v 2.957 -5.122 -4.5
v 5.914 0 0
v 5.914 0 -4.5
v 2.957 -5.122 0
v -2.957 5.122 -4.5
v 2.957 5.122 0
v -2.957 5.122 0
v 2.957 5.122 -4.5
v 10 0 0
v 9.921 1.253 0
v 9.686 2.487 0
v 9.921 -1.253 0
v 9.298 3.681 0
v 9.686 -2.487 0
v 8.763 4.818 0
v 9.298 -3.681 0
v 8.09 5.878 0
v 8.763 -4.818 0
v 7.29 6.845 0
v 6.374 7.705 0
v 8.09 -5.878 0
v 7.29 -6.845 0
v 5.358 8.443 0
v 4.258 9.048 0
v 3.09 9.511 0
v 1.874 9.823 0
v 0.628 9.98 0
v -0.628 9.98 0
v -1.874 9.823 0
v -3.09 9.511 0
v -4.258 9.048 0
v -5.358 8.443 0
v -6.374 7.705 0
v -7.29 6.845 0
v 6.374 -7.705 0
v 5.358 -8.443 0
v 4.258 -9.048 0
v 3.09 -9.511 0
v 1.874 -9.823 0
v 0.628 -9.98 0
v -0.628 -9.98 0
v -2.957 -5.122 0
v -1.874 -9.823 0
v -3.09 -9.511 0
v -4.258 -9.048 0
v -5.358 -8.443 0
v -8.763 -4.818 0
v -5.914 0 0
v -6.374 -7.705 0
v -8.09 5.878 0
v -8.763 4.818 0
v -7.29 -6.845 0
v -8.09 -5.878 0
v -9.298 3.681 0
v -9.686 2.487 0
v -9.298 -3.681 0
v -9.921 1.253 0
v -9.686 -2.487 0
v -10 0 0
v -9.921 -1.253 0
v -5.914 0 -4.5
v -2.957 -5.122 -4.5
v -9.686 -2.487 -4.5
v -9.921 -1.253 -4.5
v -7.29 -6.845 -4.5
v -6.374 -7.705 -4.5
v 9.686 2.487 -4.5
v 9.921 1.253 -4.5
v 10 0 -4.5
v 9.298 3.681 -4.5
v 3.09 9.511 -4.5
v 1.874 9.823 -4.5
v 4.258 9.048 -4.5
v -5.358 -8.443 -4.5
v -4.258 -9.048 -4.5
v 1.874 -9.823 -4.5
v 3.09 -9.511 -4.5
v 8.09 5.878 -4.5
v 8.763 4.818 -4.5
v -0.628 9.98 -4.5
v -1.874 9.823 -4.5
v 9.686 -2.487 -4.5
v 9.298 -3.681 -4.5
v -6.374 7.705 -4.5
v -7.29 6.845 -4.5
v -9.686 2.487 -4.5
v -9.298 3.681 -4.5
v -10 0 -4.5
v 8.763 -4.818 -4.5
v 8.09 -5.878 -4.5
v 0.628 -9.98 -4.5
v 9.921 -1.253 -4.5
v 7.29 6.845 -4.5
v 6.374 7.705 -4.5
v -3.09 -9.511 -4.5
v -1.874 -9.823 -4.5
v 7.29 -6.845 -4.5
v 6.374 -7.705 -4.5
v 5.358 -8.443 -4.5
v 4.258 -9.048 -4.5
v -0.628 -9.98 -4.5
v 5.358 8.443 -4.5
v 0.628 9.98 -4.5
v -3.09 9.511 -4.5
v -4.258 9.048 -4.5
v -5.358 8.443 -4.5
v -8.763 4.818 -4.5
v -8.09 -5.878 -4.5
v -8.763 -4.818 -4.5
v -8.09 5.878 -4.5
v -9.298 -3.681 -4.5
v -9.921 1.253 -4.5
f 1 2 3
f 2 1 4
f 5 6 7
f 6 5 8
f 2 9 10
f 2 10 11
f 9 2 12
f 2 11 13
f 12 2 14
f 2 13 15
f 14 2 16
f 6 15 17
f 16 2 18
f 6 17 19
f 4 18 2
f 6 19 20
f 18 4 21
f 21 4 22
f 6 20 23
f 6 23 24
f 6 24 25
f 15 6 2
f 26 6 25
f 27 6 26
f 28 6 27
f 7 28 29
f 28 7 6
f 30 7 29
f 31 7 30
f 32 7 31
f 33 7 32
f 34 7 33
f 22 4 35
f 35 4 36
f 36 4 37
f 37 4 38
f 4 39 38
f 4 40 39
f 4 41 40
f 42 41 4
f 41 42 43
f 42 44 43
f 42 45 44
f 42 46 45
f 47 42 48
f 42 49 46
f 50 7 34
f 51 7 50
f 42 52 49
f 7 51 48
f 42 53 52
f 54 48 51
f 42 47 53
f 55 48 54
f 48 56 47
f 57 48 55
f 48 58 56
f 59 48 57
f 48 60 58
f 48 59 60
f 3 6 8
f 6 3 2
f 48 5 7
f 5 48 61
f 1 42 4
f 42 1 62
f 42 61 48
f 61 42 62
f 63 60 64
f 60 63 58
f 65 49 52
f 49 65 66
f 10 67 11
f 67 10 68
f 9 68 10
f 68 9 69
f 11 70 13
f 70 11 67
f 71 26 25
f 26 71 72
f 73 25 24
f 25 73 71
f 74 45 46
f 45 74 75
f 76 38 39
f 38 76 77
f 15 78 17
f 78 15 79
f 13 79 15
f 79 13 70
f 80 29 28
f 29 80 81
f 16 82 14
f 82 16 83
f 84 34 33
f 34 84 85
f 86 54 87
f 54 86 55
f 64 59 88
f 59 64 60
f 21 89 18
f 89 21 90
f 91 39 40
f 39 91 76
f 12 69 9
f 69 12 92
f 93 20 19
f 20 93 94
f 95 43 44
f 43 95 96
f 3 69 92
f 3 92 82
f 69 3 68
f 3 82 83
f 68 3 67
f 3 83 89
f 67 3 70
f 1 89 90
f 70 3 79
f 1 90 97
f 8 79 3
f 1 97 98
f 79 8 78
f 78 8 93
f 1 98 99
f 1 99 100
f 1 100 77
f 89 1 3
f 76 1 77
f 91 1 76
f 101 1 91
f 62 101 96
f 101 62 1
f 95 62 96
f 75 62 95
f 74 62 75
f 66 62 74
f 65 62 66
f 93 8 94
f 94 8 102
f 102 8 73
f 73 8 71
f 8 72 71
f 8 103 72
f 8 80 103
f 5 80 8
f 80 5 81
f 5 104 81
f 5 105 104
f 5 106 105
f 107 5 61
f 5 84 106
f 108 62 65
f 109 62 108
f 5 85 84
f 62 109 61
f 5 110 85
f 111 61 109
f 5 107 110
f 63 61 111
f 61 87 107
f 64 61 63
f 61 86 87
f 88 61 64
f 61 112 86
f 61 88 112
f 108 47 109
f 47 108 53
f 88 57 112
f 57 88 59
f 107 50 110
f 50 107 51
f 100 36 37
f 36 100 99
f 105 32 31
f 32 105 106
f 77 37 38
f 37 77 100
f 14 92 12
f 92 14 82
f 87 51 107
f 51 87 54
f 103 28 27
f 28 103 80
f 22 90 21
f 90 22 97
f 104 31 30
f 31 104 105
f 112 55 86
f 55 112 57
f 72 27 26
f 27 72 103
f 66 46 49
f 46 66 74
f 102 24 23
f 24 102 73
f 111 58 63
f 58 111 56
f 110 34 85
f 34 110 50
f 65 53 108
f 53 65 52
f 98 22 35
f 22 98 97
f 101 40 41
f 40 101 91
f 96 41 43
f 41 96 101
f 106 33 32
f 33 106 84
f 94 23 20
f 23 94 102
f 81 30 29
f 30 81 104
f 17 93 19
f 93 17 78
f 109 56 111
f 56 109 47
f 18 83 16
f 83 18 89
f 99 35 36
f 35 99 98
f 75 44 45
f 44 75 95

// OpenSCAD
$fn = 50;

difference() {
	union() {
		translate(v = [0, 0, -4.5]) {
			cylinder(h = 4.5, r = 10.0);
		}
	}
	union() {
		translate(v = [0, 0, 0]) {
			rotate(a = [0, 0, 0]) {
				difference() {
					union() {
						translate(v = [0, 0, -5]) {
							linear_extrude(height = 5) {
								polygon(points = [[5.914249999999999, 0.0], [2.957125, 5.1218907443321156], [-2.9571249999999982, 5.1218907443321156], [-5.914249999999999, 7.242867331857232e-16], [-2.9571250000000022, -5.121890744332115], [2.9571249999999956, -5.121890744332118]]);
							}
						}
					}
					union();
				}
			}
		}
		#translate(v = [0, 0, -100.0]) {
			cylinder(h = 200, r = 3.25);
		}
	}
}
